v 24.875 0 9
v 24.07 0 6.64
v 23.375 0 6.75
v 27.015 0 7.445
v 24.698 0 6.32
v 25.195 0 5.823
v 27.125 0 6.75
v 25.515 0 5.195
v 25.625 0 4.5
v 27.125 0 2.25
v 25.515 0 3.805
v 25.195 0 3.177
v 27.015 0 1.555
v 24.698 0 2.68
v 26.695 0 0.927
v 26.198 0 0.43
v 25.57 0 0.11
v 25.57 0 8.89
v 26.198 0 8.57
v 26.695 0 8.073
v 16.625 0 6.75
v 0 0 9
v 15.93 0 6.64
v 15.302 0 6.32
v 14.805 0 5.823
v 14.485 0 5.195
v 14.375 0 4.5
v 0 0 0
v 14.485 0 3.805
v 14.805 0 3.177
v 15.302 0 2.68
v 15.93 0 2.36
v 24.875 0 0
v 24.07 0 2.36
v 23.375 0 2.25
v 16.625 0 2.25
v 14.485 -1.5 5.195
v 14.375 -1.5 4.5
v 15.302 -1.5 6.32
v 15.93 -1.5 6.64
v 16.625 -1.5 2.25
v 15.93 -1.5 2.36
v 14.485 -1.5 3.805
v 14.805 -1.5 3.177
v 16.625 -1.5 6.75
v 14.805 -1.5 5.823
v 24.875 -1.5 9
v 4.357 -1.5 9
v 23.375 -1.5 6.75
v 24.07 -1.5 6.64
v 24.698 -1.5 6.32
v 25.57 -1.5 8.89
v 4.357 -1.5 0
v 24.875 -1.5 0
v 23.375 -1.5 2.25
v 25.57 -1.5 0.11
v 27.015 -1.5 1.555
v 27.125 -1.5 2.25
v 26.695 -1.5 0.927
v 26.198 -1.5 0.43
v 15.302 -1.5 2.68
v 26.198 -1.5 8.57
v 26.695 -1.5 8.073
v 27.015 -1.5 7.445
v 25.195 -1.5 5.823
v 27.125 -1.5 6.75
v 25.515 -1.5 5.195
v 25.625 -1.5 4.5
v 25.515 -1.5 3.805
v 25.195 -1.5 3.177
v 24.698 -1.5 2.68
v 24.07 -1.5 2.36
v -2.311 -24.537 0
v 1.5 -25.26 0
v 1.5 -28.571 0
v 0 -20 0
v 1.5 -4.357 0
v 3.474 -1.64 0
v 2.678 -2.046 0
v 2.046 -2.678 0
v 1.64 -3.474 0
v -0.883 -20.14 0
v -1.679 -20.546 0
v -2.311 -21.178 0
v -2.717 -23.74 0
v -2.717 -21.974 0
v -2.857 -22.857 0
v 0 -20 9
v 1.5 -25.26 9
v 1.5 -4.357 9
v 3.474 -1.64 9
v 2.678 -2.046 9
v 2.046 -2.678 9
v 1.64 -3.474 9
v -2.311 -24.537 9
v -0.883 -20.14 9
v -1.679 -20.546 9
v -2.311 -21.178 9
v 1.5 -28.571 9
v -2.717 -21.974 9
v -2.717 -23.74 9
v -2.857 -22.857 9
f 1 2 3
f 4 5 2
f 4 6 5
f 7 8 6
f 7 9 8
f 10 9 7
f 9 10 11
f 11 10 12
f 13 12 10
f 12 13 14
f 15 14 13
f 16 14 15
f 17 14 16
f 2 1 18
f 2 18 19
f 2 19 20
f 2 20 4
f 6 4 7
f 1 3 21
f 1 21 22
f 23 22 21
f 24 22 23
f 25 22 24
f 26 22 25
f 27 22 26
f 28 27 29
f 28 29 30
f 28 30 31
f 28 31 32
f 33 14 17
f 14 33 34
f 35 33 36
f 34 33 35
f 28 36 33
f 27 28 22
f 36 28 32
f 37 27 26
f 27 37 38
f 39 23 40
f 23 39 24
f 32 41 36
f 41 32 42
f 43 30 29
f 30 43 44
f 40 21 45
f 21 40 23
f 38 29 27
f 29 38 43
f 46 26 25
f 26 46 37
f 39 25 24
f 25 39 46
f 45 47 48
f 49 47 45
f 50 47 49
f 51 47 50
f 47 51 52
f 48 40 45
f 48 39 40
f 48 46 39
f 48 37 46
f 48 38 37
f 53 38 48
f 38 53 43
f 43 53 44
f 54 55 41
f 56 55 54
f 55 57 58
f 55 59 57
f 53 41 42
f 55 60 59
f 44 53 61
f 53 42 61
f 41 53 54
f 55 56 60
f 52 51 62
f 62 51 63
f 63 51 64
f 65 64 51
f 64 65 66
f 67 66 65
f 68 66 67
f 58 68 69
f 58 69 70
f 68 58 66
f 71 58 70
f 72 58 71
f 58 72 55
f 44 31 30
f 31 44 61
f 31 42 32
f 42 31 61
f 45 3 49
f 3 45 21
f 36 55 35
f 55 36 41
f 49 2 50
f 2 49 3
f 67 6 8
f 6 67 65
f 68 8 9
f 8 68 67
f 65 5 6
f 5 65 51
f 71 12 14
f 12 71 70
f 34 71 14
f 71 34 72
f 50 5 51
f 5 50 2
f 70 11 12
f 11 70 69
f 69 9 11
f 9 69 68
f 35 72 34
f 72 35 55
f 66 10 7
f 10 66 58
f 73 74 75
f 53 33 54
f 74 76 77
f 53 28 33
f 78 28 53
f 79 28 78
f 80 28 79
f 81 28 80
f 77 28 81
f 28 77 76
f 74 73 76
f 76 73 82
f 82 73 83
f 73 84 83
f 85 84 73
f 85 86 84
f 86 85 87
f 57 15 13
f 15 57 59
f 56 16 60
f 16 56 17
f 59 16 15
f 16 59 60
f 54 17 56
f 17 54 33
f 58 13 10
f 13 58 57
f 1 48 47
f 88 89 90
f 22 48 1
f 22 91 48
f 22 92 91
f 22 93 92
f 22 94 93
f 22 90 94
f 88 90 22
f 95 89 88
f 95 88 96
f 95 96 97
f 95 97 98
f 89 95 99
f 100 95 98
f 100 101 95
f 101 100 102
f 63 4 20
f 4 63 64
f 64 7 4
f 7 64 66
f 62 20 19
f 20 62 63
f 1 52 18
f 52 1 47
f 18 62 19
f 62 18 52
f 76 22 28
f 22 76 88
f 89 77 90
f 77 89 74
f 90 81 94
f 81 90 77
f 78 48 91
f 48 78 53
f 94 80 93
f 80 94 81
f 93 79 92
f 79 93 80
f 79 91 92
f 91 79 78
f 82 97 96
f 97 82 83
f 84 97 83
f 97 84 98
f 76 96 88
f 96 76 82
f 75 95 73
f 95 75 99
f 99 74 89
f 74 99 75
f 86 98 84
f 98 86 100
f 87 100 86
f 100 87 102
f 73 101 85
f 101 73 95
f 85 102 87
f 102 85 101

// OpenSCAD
//  Door latch
$fn=20;

module latch(panel_depth, screw_distance, screw_dia){
	thickness = 1.5;
	latch_r = panel_depth / 7;
	hole_length = 2.5 * screw_dia;
	hole_r= screw_dia / 2;
	width = screw_dia*2;

	union(){
		// mount
		difference(){
			// backplate
			cube([screw_distance+hole_length/2+thickness, width, thickness]);
			// hole
			translate([screw_distance, 0, 0])
				#translate([-hole_length/2+hole_r, screw_dia, 0]) union(){
					cylinder(h=thickness, r=hole_r);
					translate([0, -hole_r, 0])
						cube(size=[hole_length-screw_dia, screw_dia, thickness]);
					translate([hole_length-screw_dia, 0 ,0])
						cylinder(h=thickness, r=hole_r);
				}
			// Rounded corners
			translate([screw_distance+hole_length/2+thickness-hole_r, 0, 0])
			 	union(){
			 		difference(){
			 			cube(size=[hole_r, hole_r, thickness]);
			 			translate([0, hole_r, 0]) cylinder(h=thickness, r=hole_r);
			 		}
			 		translate([0, width-hole_r, 0])
			 			difference(){
			 				cube(size=[hole_r, hole_r, thickness]);
			 				cylinder(h=thickness, r=hole_r);
			 			}
			 	}
		}
		// latch
		union(){
			cube(size=[thickness, width, panel_depth+latch_r]);
			hull(){
				difference(){
					translate([0, width, panel_depth+latch_r])
						rotate([90, 0, 0])
							cylinder(h=width, r=latch_r);
					translate([thickness, -0.1, panel_depth])
						cube(size=[latch_r, width+0.2, latch_r*2]);
				}
				
				translate([-latch_r, width, panel_depth+latch_r])
					rotate([90, 0, 0])
					linear_extrude(height = width, convexity = 10)
						polygon(points=[[0,0], [latch_r+thickness,0], [latch_r+thickness, latch_r*2]]);
			}

			//Fillet
			difference(){
				translate([thickness, 0, thickness])
					cube(size=[latch_r, width, latch_r]);
				translate([thickness+latch_r, width+0.1, latch_r+thickness])
					rotate([90, 0, 0])
						cylinder(h=width+0.2, r=latch_r);
			}
		}
	}


}

rotate([90,0,0]) 
	latch(20, 20, 4.5);
